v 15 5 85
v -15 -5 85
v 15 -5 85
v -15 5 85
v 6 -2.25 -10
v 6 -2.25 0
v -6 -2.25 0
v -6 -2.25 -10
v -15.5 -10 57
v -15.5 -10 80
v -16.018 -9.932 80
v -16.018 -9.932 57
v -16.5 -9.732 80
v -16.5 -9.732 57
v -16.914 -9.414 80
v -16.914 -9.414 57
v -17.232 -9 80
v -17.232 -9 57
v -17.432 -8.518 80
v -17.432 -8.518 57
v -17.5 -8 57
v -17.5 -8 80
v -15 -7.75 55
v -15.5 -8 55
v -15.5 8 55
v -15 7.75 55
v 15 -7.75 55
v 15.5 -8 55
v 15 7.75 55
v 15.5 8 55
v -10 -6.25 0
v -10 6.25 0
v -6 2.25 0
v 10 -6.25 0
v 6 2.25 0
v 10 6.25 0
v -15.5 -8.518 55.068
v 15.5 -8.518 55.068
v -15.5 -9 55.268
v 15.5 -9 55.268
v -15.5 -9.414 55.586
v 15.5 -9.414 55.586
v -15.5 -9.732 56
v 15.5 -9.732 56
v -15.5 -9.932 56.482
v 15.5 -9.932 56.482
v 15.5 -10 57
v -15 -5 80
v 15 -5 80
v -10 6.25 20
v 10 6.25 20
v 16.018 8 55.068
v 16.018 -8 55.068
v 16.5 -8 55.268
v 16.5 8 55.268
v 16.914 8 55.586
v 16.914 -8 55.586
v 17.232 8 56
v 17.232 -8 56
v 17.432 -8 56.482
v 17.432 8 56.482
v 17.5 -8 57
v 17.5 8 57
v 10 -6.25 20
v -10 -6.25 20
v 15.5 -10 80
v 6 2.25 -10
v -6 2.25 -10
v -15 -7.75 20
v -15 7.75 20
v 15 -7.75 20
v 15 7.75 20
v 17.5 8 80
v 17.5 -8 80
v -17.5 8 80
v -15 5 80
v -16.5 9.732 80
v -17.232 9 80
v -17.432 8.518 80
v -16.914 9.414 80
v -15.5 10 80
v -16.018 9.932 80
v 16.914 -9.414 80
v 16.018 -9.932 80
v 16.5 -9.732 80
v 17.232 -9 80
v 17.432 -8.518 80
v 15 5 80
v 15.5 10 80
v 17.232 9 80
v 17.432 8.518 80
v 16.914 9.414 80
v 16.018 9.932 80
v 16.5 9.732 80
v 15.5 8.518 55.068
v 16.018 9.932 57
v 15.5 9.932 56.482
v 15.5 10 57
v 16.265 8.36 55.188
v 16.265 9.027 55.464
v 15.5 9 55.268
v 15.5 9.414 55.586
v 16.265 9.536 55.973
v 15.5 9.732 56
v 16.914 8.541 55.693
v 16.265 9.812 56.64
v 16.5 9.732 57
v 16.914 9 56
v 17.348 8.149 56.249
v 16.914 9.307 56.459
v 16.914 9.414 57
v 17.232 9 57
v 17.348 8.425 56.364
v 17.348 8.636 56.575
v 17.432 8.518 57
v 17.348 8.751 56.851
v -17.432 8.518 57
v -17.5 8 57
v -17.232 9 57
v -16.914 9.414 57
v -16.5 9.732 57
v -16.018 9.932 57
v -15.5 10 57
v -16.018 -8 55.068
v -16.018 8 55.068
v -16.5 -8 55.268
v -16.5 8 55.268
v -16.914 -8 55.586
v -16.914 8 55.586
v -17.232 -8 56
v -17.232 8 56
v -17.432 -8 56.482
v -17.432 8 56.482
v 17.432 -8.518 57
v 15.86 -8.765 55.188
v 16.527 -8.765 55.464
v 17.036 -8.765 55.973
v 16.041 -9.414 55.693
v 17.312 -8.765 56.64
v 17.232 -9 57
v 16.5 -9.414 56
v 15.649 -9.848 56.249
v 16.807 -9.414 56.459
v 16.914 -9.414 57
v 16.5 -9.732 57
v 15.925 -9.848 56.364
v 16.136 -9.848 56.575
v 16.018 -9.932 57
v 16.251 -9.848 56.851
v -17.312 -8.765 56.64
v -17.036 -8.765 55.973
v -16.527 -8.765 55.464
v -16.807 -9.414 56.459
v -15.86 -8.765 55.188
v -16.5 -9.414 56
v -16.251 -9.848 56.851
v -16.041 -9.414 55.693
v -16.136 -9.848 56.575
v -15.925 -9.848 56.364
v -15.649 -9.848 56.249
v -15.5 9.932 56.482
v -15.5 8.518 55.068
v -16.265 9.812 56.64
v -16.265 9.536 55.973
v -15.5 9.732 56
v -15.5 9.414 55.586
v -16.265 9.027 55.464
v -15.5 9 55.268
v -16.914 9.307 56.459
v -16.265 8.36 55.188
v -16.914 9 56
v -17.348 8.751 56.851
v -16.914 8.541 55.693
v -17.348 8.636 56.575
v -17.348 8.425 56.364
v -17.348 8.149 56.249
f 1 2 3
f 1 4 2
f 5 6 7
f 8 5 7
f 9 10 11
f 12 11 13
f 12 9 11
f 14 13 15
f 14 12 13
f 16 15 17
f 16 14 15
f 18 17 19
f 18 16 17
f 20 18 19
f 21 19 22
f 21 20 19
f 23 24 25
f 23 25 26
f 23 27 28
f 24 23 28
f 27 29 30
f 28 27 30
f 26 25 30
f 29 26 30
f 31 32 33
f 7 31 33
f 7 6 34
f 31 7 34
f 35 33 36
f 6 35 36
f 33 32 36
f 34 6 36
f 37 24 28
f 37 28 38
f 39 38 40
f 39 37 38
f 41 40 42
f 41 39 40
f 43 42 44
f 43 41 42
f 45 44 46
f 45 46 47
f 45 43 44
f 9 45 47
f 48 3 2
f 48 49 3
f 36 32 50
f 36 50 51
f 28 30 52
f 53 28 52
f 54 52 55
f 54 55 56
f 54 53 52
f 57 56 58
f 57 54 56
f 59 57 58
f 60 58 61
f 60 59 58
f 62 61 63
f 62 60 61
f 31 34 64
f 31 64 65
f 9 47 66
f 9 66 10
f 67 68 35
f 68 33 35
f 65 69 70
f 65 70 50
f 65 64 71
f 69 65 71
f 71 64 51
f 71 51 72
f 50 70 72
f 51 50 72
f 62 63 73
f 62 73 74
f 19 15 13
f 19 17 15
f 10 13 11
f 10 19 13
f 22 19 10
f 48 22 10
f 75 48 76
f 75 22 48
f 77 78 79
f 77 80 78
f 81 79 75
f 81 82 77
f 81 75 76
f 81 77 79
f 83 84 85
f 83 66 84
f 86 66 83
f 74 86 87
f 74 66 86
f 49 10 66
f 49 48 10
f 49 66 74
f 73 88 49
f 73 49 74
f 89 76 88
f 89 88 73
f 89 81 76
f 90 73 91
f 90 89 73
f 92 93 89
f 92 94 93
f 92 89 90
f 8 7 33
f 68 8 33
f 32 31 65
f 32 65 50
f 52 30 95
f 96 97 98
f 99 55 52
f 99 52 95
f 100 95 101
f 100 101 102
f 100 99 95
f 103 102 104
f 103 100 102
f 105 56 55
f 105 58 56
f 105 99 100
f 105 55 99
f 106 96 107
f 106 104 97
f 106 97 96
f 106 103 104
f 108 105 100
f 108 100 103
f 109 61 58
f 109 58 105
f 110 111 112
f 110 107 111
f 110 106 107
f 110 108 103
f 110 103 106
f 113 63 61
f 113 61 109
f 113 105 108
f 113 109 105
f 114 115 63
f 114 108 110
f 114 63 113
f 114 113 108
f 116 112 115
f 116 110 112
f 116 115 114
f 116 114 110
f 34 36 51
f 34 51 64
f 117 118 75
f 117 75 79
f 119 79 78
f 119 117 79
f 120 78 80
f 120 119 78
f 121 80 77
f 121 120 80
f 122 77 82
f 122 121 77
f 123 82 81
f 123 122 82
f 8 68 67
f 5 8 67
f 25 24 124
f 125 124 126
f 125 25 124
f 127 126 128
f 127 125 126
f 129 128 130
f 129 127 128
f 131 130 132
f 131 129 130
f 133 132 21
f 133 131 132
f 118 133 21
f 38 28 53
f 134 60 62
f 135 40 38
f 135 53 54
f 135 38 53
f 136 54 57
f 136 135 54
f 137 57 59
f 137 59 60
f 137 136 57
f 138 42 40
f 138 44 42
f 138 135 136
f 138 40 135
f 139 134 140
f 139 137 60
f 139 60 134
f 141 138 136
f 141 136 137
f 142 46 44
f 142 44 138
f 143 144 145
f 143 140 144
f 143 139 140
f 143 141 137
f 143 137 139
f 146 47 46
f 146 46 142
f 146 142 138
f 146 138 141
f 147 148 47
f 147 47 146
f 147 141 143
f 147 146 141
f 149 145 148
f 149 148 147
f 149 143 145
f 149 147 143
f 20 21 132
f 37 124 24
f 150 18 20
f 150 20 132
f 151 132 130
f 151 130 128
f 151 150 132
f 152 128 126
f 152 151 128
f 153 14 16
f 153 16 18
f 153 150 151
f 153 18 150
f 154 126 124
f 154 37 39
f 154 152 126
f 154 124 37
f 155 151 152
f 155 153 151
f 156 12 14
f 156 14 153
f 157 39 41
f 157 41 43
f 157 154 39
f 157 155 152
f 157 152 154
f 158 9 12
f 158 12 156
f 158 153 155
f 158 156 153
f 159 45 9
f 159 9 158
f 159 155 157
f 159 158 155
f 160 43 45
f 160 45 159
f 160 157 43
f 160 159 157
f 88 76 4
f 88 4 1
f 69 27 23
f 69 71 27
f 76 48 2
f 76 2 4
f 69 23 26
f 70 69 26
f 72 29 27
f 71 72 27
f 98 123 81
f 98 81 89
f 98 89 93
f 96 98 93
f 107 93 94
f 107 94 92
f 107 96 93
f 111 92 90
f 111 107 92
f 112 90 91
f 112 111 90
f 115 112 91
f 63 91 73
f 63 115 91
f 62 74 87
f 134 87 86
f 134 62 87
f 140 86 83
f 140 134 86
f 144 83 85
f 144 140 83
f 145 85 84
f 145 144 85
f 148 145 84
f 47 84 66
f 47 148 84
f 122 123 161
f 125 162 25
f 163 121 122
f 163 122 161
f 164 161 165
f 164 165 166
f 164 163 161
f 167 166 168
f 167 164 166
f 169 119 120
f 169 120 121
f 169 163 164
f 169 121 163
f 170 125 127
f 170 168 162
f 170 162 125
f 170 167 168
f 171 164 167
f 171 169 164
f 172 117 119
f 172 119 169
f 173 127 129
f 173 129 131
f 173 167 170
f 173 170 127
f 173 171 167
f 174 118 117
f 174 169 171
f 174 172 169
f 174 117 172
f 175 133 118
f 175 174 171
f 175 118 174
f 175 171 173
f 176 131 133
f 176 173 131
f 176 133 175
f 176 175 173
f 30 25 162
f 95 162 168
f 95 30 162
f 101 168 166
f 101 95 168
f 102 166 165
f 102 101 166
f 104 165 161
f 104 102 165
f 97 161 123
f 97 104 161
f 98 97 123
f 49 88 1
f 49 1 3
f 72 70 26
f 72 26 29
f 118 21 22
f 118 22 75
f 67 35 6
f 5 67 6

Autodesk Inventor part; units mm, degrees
ref_plane "YZ Plane" through (0, 0, 0) normal (1, 0, 0) x (0, 1, 0)
ref_plane "XZ Plane" through (0, 0, 0) normal (0, 1, 0) x (-1, 0, 0)
ref_plane "XY Plane" through (0, 0, 0) normal (0, 0, 1) x (1, 0, 0)
sketch "Szkic1" plane through (0, 0, 0) normal (0, 0, 1) x (1, 0, 0)
  line L0 (6, -2.25) -> (-6, -2.25)
  line L1 (-6, -2.25) -> (-6, 2.25)
  line L2 (-6, 2.25) -> (6, 2.25)
  line L3 (6, 2.25) -> (6, -2.25)
  line L4 (6, -2.25) -> (-6, 2.25) construction
  line L5 (-6, -2.25) -> (6, 2.25) construction
  line L6 (6, -2.25) -> (-6, -2.25)
  line L7 (-6, -2.25) -> (-6, 2.25)
  line L8 (-6, 2.25) -> (6, 2.25)
  line L9 (6, 2.25) -> (6, -2.25)
  line L10 (6, -2.25) -> (-6, 2.25) construction
  line L11 (-6, -2.25) -> (6, 2.25) construction
  point P0 (0, 0)
  dimension "d0" = 12
  dimension "d1" = 4.5
extrude "Wyciągnięcie proste1" add sketch "Szkic1" against normal blind 10
sketch "Szkic2" plane through (0, 0, -10) normal (0, 0, -1) x (-1, 0, 0)
  line L0 (6, 2.25) -> (-6, 2.25) projected
  line L1 (6, -2.25) -> (-6, -2.25)
  line L2 (-6, -2.25) -> (-6, 2.25)
  line L3 (-6, 2.25) -> (6, 2.25)
  line L4 (6, 2.25) -> (6, -2.25)
  line L5 (6, -2.25) -> (-6, 2.25) construction
  line L6 (-6, -2.25) -> (6, 2.25) construction
  point P0 (0, 0)
sketch "Szkic3" plane through (0, 0, 0) normal (0, 0, 1) x (1, 0, 0)
  line L0 (10, -6.25) -> (-10, -6.25)
  line L1 (-10, -6.25) -> (-10, 6.25)
  line L2 (-10, 6.25) -> (10, 6.25)
  line L3 (10, 6.25) -> (10, -6.25)
  line L4 (10, -6.25) -> (-10, 6.25) construction
  line L5 (-10, -6.25) -> (10, 6.25) construction
  point P0 (0, 0)
  dimension "d4" = 20
  dimension "d5" = 12.5
extrude "Wyciągnięcie proste2" add sketch "Szkic3" along normal blind 20
sketch "Szkic5" plane through (0, 0, 20) normal (0, 0, 1) x (1, 0, 0)
  line L0 (15, -7.75) -> (-15, -7.75)
  line L1 (-15, -7.75) -> (-15, 7.75)
  line L2 (-15, 7.75) -> (15, 7.75)
  line L3 (15, 7.75) -> (15, -7.75)
  line L4 (15, -7.75) -> (-15, 7.75) construction
  line L5 (-15, -7.75) -> (15, 7.75) construction
  point P0 (0, 0)
  dimension "d8" = 15.5
  dimension "d9" = 30
extrude "Wyciągnięcie proste3" add sketch "Szkic5" along normal blind 35
sketch "Szkic6" plane through (0, 0, 55) normal (0, 0, 1) x (1, 0, 0)
  line L0 (17.5, -10) -> (-17.5, -10)
  line L1 (-17.5, -10) -> (-17.5, 10)
  line L2 (-17.5, 10) -> (17.5, 10)
  line L3 (17.5, 10) -> (17.5, -10)
  line L4 (17.5, -10) -> (-17.5, 10) construction
  line L5 (-17.5, -10) -> (17.5, 10) construction
  point P0 (0, 0)
  dimension "d12" = 20
  dimension "d13" = 35
extrude "Wyciągnięcie proste4" add sketch "Szkic6" along normal blind 25
sketch "Szkic7" plane through (0, 0, 80) normal (0, 0, 1) x (1, 0, 0)
  line L0 (15, -5) -> (-15, -5)
  line L1 (-15, -5) -> (-15, 5)
  line L2 (-15, 5) -> (15, 5)
  line L3 (15, 5) -> (15, -5)
  line L4 (15, -5) -> (-15, 5) construction
  line L5 (-15, -5) -> (15, 5) construction
  point P0 (0, 0)
  dimension "d16" = 10
  dimension "d17" = 30
extrude "Wyciągnięcie proste5" add sketch "Szkic7" along normal blind 5
fillet "Zaokrąglenie1" radius 2 4 edges at (0, 10, 55) (-17.5, 0, 55) (17.5, 0, 55) (0, -10, 55)
fillet "Zaokrąglenie2" radius 2 8 edges at (16.9142, 9.4142, 55.5858) (17.5, 10, 68.5) (-16.9142, 9.4142, 55.5858) (-17.5, 10, 68.5) (16.9142, -9.4142, 55.5858) (17.5, -10, 68.5) (-16.9142, -9.4142, 55.5858) (-17.5, -10, 68.5)
properties part number "USB2Dynamixel-XD"
